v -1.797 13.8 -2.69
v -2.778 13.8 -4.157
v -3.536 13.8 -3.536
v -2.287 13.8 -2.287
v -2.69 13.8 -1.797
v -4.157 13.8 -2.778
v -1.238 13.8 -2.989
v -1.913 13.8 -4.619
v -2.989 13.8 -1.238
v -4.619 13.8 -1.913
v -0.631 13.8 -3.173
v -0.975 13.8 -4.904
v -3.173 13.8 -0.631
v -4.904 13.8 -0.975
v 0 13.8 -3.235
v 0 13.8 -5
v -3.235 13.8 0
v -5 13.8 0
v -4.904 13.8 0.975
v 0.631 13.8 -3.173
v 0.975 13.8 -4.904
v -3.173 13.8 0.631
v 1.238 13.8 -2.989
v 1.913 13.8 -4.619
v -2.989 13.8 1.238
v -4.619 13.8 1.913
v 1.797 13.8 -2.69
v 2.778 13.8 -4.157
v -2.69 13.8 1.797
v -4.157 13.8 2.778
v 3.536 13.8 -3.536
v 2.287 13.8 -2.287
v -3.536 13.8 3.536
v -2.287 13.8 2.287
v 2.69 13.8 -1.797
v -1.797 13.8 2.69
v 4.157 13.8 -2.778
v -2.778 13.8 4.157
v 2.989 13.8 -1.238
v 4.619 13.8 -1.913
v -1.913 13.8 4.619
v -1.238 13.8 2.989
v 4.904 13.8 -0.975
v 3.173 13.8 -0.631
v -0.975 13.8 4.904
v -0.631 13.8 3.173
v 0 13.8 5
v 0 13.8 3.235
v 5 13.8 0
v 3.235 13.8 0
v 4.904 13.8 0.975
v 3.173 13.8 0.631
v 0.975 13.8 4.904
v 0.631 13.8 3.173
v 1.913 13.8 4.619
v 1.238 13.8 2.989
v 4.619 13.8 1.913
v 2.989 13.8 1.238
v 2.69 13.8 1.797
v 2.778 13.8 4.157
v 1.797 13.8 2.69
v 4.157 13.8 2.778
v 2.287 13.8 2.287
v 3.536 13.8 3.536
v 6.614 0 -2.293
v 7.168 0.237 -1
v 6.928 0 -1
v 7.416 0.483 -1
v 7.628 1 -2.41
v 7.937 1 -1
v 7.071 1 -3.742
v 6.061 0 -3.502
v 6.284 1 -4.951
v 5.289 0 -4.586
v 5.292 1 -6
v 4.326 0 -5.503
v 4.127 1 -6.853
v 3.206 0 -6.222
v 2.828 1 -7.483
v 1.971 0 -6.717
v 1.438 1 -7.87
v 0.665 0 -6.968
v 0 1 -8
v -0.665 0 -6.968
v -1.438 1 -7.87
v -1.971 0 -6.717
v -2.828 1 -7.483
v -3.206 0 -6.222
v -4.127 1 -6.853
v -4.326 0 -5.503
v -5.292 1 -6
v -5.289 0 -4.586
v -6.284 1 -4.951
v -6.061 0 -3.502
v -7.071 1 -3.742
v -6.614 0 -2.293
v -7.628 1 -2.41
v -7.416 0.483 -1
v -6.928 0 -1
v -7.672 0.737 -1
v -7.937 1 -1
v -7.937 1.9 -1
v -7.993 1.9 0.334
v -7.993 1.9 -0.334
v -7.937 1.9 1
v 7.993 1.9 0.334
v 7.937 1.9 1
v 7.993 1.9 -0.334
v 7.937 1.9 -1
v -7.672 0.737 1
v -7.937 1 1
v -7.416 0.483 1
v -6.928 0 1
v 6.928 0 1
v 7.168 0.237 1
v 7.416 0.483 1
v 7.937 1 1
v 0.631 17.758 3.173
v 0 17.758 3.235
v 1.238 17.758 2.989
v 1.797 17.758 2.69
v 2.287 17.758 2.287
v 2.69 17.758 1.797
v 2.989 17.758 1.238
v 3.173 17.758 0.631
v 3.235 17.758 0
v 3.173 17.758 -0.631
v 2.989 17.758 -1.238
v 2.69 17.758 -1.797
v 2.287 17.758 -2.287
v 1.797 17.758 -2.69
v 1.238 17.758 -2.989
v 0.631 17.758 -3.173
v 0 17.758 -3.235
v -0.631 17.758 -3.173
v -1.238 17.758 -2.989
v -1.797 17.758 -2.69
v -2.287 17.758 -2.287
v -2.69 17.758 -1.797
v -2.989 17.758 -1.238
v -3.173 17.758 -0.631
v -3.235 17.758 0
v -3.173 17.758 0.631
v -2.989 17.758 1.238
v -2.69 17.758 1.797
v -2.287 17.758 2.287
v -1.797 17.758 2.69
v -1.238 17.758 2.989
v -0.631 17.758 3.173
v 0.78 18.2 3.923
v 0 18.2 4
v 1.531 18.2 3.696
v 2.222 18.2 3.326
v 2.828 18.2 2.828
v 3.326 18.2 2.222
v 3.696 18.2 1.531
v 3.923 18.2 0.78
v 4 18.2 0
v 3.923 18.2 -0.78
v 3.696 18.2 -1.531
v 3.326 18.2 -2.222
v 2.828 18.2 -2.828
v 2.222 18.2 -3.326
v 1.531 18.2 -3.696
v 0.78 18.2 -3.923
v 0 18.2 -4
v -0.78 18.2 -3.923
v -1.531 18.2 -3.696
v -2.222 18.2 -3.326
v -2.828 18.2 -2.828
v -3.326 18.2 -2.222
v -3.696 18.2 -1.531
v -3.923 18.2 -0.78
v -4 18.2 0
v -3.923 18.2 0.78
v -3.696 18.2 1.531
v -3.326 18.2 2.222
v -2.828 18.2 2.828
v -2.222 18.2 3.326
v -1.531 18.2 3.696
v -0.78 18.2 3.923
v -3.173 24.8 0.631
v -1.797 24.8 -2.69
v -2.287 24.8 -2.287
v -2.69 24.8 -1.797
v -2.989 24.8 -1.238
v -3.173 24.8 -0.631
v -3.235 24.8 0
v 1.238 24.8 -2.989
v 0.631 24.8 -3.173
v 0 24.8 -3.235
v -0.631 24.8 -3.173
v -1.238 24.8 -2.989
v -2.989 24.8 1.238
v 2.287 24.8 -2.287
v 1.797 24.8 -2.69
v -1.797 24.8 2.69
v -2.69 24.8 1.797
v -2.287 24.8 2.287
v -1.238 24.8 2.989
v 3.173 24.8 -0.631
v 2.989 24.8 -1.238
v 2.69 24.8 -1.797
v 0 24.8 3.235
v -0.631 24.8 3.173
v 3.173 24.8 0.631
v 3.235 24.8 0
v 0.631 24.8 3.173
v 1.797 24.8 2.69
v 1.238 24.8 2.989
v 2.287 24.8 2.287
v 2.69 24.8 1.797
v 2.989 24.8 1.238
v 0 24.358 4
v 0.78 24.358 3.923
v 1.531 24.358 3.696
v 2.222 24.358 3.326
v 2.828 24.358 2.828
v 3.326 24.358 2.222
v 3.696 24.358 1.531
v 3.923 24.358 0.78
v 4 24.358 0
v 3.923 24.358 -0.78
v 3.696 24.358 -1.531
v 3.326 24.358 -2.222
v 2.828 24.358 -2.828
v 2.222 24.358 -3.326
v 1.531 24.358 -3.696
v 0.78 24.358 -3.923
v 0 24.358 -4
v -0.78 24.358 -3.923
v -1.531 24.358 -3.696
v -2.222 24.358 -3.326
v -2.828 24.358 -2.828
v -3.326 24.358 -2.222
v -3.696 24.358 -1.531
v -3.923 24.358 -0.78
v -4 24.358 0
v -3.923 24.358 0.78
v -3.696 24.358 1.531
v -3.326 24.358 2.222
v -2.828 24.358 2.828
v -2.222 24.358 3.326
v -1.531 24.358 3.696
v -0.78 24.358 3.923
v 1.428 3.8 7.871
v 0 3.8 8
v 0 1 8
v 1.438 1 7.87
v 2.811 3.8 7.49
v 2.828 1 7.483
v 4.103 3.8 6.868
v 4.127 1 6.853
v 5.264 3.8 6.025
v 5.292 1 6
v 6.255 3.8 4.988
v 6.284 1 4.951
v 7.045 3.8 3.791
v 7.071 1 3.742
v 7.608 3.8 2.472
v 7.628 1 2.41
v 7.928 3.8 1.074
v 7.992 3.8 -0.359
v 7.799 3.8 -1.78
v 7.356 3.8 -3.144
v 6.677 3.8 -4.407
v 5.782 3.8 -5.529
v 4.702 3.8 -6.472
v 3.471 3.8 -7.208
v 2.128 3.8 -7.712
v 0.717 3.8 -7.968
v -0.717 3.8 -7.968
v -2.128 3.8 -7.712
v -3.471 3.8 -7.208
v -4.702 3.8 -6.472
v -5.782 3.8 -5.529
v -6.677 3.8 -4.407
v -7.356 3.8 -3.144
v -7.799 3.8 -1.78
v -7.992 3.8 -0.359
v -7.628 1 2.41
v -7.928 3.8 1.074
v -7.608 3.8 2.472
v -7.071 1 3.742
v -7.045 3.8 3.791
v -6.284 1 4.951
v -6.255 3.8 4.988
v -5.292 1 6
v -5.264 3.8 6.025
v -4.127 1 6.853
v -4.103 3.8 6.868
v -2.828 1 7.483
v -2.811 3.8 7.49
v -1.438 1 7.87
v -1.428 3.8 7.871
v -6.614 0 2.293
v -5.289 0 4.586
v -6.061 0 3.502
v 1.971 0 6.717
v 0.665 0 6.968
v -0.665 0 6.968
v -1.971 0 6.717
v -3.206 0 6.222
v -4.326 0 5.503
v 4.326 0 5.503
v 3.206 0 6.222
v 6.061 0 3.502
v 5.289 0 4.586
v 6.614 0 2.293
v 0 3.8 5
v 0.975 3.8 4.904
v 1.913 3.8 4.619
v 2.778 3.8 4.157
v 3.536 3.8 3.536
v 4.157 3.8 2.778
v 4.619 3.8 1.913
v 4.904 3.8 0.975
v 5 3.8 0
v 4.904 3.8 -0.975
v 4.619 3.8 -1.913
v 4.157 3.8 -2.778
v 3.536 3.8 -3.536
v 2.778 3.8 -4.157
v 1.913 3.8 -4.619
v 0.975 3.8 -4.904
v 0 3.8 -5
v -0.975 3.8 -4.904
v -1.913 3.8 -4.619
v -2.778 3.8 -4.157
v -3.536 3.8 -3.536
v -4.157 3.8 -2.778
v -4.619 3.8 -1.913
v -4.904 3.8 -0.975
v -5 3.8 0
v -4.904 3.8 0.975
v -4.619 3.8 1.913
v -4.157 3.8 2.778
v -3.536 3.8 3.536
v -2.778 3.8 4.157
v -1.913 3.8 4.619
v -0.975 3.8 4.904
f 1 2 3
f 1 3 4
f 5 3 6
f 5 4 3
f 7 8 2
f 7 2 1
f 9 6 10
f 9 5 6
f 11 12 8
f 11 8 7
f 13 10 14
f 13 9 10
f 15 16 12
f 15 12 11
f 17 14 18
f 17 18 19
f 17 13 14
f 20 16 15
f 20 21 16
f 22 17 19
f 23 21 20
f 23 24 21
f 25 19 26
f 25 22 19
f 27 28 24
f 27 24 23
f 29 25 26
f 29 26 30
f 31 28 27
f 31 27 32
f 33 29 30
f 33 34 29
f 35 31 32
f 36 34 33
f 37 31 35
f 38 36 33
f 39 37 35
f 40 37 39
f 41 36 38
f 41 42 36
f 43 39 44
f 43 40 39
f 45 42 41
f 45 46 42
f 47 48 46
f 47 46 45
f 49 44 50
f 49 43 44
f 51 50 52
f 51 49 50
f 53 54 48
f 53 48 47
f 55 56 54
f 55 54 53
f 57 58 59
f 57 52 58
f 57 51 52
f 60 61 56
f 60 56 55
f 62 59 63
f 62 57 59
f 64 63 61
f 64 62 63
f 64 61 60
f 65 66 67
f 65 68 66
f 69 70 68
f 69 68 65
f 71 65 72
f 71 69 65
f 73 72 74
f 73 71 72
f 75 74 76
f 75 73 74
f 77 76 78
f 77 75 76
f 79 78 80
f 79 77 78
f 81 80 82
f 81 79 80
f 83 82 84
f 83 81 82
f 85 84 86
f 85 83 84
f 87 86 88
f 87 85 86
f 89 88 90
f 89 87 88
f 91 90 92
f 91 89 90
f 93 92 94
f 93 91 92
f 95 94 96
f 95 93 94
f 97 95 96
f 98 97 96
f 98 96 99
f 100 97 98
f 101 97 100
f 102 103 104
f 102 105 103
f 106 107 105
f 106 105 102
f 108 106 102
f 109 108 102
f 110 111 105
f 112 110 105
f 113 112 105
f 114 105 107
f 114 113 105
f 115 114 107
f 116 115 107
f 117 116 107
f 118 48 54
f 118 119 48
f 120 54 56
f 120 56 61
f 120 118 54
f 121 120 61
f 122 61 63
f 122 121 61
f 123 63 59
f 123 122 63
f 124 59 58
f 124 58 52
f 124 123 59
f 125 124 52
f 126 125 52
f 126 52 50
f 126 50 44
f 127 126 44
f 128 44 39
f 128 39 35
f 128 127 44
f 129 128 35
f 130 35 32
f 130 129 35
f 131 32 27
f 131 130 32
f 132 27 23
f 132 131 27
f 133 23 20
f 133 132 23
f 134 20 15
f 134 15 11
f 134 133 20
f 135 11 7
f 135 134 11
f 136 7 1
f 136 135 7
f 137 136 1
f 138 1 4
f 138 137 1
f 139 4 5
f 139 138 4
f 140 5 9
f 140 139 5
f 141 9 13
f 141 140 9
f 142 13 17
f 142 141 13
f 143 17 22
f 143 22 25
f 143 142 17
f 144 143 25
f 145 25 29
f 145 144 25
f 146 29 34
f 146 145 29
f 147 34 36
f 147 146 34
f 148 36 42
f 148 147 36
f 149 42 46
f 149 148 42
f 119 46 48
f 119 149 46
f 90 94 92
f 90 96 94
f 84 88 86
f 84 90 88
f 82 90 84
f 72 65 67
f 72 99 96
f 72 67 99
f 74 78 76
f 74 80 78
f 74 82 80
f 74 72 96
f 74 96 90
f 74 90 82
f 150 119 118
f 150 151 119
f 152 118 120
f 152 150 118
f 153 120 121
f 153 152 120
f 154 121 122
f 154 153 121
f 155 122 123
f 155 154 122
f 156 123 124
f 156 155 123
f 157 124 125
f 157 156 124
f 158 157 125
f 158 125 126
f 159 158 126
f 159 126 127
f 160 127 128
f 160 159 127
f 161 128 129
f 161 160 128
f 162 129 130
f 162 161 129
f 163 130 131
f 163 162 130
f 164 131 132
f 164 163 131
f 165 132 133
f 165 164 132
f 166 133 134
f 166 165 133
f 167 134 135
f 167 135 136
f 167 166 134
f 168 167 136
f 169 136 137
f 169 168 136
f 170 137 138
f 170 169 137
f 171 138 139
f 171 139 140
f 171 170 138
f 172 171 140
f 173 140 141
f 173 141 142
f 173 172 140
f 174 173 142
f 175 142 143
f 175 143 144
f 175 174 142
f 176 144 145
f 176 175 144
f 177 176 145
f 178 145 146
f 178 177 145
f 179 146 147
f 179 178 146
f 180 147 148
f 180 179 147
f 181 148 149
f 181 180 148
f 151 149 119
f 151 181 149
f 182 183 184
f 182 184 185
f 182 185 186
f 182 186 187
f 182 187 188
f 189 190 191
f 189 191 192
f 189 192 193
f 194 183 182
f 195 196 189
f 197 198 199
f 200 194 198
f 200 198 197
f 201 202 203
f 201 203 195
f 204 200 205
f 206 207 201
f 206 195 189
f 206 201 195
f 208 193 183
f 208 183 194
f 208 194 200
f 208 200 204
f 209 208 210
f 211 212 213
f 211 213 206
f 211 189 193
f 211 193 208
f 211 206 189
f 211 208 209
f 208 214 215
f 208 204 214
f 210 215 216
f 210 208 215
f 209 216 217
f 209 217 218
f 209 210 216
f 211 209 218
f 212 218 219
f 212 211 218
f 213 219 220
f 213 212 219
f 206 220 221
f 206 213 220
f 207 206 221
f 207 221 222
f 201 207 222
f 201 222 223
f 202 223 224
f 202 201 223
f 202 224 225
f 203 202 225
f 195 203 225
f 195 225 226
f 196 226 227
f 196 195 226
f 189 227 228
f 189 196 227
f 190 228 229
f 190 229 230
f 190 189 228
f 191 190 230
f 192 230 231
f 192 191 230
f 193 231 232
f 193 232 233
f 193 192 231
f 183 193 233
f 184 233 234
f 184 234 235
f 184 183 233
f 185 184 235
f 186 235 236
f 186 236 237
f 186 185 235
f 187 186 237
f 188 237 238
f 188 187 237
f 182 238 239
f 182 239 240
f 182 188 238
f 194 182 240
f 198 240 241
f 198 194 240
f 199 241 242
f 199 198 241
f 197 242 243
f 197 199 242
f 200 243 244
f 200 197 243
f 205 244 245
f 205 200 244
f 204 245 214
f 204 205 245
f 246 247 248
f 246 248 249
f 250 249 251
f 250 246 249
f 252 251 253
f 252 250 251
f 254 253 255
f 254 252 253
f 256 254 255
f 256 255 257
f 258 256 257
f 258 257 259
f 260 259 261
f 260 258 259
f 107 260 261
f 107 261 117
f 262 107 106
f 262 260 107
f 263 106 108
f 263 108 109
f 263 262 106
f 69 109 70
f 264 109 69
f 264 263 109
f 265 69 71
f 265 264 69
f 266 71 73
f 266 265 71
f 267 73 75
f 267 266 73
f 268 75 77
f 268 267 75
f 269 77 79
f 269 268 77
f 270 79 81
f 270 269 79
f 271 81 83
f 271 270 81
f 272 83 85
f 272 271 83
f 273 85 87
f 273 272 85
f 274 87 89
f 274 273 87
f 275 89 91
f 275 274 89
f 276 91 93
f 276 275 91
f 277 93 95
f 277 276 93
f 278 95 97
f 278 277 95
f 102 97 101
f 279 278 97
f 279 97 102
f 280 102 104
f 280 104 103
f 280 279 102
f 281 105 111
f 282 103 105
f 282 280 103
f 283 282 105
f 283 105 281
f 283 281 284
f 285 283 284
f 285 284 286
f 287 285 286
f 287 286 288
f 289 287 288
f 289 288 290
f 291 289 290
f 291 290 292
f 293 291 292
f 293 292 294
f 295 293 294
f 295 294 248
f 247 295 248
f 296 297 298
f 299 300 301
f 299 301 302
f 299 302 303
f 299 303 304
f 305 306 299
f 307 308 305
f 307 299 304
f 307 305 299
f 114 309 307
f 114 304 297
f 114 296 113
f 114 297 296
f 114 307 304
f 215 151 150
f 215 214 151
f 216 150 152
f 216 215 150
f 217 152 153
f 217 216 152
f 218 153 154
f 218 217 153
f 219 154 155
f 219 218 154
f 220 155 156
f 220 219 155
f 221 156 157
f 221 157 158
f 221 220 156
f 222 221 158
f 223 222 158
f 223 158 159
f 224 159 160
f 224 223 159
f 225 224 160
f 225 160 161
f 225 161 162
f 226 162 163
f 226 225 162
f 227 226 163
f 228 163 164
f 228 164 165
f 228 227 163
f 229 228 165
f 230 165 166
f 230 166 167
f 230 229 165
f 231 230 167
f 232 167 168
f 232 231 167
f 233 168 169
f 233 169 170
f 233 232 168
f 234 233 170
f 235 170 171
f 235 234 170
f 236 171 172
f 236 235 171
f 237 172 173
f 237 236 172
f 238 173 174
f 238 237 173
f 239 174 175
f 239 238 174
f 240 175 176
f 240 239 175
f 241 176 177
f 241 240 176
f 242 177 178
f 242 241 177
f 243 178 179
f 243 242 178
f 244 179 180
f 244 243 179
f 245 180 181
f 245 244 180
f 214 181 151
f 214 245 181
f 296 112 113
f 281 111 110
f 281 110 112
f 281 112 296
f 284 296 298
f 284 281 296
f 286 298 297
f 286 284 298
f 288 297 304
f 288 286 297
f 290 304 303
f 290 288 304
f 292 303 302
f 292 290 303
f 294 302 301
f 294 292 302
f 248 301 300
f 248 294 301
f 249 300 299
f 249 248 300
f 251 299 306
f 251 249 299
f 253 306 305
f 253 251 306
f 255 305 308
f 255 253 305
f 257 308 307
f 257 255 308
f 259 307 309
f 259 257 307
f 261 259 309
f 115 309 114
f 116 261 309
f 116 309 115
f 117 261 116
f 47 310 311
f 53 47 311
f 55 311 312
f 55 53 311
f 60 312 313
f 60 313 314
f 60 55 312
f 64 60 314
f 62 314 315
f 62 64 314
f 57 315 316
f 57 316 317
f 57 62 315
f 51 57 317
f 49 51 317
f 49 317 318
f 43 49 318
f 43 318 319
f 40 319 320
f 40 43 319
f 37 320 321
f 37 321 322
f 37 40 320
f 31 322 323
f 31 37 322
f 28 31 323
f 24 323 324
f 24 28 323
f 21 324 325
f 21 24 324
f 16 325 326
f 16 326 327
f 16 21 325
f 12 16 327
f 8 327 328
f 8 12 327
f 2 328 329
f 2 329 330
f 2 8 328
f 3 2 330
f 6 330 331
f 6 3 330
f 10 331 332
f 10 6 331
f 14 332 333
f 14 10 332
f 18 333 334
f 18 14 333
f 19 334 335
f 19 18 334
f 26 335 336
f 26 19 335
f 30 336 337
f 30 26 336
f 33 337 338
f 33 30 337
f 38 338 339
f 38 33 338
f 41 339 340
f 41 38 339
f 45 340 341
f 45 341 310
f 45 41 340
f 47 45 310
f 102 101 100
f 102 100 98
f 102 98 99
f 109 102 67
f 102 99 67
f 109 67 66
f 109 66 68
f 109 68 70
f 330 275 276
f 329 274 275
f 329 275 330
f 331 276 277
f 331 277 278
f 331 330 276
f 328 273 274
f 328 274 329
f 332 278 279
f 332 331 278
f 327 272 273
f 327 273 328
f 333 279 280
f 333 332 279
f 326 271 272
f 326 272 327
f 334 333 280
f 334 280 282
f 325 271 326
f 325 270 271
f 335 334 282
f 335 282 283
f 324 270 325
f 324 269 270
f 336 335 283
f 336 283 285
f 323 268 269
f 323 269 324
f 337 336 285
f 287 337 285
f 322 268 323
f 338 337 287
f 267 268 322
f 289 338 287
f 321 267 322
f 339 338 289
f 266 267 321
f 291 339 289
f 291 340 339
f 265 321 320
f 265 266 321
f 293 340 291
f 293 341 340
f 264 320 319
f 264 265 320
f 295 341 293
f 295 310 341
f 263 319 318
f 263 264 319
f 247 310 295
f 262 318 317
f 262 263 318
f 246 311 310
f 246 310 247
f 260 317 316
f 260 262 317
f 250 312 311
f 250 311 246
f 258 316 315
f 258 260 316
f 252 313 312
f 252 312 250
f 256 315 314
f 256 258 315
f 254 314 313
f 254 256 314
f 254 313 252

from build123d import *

# Parameters (mm, degrees)
SKETCH001_W  = 2
SKETCH001_H  = 16
POCKET_DEPTH = 1.9


with BuildPart() as part:
    # Sketch → Revolution (revolve)
    with BuildSketch(Plane.YZ):
        Polygon((0, 0), (0, 7), (1, 8), (3.8, 8), (3.8, 5), (13.8, 5), (13.8, 3.235), (17.758327, 3.235), (18.2, 4), (24.358327, 4), (24.8, 3.235), (24.8, 0), align=None)
    revolve(axis=Axis((0, 0, 0), (0, 1, 0)))

    # Sketch001 → Pocket (cut)
    with BuildSketch(Plane(origin=(0, 0, 0), x_dir=(0, 0, -1), z_dir=(0, -1, 0))):
        Rectangle(SKETCH001_W, SKETCH001_H)
    extrude(amount=-POCKET_DEPTH, mode=Mode.SUBTRACT)


solid = part.part
